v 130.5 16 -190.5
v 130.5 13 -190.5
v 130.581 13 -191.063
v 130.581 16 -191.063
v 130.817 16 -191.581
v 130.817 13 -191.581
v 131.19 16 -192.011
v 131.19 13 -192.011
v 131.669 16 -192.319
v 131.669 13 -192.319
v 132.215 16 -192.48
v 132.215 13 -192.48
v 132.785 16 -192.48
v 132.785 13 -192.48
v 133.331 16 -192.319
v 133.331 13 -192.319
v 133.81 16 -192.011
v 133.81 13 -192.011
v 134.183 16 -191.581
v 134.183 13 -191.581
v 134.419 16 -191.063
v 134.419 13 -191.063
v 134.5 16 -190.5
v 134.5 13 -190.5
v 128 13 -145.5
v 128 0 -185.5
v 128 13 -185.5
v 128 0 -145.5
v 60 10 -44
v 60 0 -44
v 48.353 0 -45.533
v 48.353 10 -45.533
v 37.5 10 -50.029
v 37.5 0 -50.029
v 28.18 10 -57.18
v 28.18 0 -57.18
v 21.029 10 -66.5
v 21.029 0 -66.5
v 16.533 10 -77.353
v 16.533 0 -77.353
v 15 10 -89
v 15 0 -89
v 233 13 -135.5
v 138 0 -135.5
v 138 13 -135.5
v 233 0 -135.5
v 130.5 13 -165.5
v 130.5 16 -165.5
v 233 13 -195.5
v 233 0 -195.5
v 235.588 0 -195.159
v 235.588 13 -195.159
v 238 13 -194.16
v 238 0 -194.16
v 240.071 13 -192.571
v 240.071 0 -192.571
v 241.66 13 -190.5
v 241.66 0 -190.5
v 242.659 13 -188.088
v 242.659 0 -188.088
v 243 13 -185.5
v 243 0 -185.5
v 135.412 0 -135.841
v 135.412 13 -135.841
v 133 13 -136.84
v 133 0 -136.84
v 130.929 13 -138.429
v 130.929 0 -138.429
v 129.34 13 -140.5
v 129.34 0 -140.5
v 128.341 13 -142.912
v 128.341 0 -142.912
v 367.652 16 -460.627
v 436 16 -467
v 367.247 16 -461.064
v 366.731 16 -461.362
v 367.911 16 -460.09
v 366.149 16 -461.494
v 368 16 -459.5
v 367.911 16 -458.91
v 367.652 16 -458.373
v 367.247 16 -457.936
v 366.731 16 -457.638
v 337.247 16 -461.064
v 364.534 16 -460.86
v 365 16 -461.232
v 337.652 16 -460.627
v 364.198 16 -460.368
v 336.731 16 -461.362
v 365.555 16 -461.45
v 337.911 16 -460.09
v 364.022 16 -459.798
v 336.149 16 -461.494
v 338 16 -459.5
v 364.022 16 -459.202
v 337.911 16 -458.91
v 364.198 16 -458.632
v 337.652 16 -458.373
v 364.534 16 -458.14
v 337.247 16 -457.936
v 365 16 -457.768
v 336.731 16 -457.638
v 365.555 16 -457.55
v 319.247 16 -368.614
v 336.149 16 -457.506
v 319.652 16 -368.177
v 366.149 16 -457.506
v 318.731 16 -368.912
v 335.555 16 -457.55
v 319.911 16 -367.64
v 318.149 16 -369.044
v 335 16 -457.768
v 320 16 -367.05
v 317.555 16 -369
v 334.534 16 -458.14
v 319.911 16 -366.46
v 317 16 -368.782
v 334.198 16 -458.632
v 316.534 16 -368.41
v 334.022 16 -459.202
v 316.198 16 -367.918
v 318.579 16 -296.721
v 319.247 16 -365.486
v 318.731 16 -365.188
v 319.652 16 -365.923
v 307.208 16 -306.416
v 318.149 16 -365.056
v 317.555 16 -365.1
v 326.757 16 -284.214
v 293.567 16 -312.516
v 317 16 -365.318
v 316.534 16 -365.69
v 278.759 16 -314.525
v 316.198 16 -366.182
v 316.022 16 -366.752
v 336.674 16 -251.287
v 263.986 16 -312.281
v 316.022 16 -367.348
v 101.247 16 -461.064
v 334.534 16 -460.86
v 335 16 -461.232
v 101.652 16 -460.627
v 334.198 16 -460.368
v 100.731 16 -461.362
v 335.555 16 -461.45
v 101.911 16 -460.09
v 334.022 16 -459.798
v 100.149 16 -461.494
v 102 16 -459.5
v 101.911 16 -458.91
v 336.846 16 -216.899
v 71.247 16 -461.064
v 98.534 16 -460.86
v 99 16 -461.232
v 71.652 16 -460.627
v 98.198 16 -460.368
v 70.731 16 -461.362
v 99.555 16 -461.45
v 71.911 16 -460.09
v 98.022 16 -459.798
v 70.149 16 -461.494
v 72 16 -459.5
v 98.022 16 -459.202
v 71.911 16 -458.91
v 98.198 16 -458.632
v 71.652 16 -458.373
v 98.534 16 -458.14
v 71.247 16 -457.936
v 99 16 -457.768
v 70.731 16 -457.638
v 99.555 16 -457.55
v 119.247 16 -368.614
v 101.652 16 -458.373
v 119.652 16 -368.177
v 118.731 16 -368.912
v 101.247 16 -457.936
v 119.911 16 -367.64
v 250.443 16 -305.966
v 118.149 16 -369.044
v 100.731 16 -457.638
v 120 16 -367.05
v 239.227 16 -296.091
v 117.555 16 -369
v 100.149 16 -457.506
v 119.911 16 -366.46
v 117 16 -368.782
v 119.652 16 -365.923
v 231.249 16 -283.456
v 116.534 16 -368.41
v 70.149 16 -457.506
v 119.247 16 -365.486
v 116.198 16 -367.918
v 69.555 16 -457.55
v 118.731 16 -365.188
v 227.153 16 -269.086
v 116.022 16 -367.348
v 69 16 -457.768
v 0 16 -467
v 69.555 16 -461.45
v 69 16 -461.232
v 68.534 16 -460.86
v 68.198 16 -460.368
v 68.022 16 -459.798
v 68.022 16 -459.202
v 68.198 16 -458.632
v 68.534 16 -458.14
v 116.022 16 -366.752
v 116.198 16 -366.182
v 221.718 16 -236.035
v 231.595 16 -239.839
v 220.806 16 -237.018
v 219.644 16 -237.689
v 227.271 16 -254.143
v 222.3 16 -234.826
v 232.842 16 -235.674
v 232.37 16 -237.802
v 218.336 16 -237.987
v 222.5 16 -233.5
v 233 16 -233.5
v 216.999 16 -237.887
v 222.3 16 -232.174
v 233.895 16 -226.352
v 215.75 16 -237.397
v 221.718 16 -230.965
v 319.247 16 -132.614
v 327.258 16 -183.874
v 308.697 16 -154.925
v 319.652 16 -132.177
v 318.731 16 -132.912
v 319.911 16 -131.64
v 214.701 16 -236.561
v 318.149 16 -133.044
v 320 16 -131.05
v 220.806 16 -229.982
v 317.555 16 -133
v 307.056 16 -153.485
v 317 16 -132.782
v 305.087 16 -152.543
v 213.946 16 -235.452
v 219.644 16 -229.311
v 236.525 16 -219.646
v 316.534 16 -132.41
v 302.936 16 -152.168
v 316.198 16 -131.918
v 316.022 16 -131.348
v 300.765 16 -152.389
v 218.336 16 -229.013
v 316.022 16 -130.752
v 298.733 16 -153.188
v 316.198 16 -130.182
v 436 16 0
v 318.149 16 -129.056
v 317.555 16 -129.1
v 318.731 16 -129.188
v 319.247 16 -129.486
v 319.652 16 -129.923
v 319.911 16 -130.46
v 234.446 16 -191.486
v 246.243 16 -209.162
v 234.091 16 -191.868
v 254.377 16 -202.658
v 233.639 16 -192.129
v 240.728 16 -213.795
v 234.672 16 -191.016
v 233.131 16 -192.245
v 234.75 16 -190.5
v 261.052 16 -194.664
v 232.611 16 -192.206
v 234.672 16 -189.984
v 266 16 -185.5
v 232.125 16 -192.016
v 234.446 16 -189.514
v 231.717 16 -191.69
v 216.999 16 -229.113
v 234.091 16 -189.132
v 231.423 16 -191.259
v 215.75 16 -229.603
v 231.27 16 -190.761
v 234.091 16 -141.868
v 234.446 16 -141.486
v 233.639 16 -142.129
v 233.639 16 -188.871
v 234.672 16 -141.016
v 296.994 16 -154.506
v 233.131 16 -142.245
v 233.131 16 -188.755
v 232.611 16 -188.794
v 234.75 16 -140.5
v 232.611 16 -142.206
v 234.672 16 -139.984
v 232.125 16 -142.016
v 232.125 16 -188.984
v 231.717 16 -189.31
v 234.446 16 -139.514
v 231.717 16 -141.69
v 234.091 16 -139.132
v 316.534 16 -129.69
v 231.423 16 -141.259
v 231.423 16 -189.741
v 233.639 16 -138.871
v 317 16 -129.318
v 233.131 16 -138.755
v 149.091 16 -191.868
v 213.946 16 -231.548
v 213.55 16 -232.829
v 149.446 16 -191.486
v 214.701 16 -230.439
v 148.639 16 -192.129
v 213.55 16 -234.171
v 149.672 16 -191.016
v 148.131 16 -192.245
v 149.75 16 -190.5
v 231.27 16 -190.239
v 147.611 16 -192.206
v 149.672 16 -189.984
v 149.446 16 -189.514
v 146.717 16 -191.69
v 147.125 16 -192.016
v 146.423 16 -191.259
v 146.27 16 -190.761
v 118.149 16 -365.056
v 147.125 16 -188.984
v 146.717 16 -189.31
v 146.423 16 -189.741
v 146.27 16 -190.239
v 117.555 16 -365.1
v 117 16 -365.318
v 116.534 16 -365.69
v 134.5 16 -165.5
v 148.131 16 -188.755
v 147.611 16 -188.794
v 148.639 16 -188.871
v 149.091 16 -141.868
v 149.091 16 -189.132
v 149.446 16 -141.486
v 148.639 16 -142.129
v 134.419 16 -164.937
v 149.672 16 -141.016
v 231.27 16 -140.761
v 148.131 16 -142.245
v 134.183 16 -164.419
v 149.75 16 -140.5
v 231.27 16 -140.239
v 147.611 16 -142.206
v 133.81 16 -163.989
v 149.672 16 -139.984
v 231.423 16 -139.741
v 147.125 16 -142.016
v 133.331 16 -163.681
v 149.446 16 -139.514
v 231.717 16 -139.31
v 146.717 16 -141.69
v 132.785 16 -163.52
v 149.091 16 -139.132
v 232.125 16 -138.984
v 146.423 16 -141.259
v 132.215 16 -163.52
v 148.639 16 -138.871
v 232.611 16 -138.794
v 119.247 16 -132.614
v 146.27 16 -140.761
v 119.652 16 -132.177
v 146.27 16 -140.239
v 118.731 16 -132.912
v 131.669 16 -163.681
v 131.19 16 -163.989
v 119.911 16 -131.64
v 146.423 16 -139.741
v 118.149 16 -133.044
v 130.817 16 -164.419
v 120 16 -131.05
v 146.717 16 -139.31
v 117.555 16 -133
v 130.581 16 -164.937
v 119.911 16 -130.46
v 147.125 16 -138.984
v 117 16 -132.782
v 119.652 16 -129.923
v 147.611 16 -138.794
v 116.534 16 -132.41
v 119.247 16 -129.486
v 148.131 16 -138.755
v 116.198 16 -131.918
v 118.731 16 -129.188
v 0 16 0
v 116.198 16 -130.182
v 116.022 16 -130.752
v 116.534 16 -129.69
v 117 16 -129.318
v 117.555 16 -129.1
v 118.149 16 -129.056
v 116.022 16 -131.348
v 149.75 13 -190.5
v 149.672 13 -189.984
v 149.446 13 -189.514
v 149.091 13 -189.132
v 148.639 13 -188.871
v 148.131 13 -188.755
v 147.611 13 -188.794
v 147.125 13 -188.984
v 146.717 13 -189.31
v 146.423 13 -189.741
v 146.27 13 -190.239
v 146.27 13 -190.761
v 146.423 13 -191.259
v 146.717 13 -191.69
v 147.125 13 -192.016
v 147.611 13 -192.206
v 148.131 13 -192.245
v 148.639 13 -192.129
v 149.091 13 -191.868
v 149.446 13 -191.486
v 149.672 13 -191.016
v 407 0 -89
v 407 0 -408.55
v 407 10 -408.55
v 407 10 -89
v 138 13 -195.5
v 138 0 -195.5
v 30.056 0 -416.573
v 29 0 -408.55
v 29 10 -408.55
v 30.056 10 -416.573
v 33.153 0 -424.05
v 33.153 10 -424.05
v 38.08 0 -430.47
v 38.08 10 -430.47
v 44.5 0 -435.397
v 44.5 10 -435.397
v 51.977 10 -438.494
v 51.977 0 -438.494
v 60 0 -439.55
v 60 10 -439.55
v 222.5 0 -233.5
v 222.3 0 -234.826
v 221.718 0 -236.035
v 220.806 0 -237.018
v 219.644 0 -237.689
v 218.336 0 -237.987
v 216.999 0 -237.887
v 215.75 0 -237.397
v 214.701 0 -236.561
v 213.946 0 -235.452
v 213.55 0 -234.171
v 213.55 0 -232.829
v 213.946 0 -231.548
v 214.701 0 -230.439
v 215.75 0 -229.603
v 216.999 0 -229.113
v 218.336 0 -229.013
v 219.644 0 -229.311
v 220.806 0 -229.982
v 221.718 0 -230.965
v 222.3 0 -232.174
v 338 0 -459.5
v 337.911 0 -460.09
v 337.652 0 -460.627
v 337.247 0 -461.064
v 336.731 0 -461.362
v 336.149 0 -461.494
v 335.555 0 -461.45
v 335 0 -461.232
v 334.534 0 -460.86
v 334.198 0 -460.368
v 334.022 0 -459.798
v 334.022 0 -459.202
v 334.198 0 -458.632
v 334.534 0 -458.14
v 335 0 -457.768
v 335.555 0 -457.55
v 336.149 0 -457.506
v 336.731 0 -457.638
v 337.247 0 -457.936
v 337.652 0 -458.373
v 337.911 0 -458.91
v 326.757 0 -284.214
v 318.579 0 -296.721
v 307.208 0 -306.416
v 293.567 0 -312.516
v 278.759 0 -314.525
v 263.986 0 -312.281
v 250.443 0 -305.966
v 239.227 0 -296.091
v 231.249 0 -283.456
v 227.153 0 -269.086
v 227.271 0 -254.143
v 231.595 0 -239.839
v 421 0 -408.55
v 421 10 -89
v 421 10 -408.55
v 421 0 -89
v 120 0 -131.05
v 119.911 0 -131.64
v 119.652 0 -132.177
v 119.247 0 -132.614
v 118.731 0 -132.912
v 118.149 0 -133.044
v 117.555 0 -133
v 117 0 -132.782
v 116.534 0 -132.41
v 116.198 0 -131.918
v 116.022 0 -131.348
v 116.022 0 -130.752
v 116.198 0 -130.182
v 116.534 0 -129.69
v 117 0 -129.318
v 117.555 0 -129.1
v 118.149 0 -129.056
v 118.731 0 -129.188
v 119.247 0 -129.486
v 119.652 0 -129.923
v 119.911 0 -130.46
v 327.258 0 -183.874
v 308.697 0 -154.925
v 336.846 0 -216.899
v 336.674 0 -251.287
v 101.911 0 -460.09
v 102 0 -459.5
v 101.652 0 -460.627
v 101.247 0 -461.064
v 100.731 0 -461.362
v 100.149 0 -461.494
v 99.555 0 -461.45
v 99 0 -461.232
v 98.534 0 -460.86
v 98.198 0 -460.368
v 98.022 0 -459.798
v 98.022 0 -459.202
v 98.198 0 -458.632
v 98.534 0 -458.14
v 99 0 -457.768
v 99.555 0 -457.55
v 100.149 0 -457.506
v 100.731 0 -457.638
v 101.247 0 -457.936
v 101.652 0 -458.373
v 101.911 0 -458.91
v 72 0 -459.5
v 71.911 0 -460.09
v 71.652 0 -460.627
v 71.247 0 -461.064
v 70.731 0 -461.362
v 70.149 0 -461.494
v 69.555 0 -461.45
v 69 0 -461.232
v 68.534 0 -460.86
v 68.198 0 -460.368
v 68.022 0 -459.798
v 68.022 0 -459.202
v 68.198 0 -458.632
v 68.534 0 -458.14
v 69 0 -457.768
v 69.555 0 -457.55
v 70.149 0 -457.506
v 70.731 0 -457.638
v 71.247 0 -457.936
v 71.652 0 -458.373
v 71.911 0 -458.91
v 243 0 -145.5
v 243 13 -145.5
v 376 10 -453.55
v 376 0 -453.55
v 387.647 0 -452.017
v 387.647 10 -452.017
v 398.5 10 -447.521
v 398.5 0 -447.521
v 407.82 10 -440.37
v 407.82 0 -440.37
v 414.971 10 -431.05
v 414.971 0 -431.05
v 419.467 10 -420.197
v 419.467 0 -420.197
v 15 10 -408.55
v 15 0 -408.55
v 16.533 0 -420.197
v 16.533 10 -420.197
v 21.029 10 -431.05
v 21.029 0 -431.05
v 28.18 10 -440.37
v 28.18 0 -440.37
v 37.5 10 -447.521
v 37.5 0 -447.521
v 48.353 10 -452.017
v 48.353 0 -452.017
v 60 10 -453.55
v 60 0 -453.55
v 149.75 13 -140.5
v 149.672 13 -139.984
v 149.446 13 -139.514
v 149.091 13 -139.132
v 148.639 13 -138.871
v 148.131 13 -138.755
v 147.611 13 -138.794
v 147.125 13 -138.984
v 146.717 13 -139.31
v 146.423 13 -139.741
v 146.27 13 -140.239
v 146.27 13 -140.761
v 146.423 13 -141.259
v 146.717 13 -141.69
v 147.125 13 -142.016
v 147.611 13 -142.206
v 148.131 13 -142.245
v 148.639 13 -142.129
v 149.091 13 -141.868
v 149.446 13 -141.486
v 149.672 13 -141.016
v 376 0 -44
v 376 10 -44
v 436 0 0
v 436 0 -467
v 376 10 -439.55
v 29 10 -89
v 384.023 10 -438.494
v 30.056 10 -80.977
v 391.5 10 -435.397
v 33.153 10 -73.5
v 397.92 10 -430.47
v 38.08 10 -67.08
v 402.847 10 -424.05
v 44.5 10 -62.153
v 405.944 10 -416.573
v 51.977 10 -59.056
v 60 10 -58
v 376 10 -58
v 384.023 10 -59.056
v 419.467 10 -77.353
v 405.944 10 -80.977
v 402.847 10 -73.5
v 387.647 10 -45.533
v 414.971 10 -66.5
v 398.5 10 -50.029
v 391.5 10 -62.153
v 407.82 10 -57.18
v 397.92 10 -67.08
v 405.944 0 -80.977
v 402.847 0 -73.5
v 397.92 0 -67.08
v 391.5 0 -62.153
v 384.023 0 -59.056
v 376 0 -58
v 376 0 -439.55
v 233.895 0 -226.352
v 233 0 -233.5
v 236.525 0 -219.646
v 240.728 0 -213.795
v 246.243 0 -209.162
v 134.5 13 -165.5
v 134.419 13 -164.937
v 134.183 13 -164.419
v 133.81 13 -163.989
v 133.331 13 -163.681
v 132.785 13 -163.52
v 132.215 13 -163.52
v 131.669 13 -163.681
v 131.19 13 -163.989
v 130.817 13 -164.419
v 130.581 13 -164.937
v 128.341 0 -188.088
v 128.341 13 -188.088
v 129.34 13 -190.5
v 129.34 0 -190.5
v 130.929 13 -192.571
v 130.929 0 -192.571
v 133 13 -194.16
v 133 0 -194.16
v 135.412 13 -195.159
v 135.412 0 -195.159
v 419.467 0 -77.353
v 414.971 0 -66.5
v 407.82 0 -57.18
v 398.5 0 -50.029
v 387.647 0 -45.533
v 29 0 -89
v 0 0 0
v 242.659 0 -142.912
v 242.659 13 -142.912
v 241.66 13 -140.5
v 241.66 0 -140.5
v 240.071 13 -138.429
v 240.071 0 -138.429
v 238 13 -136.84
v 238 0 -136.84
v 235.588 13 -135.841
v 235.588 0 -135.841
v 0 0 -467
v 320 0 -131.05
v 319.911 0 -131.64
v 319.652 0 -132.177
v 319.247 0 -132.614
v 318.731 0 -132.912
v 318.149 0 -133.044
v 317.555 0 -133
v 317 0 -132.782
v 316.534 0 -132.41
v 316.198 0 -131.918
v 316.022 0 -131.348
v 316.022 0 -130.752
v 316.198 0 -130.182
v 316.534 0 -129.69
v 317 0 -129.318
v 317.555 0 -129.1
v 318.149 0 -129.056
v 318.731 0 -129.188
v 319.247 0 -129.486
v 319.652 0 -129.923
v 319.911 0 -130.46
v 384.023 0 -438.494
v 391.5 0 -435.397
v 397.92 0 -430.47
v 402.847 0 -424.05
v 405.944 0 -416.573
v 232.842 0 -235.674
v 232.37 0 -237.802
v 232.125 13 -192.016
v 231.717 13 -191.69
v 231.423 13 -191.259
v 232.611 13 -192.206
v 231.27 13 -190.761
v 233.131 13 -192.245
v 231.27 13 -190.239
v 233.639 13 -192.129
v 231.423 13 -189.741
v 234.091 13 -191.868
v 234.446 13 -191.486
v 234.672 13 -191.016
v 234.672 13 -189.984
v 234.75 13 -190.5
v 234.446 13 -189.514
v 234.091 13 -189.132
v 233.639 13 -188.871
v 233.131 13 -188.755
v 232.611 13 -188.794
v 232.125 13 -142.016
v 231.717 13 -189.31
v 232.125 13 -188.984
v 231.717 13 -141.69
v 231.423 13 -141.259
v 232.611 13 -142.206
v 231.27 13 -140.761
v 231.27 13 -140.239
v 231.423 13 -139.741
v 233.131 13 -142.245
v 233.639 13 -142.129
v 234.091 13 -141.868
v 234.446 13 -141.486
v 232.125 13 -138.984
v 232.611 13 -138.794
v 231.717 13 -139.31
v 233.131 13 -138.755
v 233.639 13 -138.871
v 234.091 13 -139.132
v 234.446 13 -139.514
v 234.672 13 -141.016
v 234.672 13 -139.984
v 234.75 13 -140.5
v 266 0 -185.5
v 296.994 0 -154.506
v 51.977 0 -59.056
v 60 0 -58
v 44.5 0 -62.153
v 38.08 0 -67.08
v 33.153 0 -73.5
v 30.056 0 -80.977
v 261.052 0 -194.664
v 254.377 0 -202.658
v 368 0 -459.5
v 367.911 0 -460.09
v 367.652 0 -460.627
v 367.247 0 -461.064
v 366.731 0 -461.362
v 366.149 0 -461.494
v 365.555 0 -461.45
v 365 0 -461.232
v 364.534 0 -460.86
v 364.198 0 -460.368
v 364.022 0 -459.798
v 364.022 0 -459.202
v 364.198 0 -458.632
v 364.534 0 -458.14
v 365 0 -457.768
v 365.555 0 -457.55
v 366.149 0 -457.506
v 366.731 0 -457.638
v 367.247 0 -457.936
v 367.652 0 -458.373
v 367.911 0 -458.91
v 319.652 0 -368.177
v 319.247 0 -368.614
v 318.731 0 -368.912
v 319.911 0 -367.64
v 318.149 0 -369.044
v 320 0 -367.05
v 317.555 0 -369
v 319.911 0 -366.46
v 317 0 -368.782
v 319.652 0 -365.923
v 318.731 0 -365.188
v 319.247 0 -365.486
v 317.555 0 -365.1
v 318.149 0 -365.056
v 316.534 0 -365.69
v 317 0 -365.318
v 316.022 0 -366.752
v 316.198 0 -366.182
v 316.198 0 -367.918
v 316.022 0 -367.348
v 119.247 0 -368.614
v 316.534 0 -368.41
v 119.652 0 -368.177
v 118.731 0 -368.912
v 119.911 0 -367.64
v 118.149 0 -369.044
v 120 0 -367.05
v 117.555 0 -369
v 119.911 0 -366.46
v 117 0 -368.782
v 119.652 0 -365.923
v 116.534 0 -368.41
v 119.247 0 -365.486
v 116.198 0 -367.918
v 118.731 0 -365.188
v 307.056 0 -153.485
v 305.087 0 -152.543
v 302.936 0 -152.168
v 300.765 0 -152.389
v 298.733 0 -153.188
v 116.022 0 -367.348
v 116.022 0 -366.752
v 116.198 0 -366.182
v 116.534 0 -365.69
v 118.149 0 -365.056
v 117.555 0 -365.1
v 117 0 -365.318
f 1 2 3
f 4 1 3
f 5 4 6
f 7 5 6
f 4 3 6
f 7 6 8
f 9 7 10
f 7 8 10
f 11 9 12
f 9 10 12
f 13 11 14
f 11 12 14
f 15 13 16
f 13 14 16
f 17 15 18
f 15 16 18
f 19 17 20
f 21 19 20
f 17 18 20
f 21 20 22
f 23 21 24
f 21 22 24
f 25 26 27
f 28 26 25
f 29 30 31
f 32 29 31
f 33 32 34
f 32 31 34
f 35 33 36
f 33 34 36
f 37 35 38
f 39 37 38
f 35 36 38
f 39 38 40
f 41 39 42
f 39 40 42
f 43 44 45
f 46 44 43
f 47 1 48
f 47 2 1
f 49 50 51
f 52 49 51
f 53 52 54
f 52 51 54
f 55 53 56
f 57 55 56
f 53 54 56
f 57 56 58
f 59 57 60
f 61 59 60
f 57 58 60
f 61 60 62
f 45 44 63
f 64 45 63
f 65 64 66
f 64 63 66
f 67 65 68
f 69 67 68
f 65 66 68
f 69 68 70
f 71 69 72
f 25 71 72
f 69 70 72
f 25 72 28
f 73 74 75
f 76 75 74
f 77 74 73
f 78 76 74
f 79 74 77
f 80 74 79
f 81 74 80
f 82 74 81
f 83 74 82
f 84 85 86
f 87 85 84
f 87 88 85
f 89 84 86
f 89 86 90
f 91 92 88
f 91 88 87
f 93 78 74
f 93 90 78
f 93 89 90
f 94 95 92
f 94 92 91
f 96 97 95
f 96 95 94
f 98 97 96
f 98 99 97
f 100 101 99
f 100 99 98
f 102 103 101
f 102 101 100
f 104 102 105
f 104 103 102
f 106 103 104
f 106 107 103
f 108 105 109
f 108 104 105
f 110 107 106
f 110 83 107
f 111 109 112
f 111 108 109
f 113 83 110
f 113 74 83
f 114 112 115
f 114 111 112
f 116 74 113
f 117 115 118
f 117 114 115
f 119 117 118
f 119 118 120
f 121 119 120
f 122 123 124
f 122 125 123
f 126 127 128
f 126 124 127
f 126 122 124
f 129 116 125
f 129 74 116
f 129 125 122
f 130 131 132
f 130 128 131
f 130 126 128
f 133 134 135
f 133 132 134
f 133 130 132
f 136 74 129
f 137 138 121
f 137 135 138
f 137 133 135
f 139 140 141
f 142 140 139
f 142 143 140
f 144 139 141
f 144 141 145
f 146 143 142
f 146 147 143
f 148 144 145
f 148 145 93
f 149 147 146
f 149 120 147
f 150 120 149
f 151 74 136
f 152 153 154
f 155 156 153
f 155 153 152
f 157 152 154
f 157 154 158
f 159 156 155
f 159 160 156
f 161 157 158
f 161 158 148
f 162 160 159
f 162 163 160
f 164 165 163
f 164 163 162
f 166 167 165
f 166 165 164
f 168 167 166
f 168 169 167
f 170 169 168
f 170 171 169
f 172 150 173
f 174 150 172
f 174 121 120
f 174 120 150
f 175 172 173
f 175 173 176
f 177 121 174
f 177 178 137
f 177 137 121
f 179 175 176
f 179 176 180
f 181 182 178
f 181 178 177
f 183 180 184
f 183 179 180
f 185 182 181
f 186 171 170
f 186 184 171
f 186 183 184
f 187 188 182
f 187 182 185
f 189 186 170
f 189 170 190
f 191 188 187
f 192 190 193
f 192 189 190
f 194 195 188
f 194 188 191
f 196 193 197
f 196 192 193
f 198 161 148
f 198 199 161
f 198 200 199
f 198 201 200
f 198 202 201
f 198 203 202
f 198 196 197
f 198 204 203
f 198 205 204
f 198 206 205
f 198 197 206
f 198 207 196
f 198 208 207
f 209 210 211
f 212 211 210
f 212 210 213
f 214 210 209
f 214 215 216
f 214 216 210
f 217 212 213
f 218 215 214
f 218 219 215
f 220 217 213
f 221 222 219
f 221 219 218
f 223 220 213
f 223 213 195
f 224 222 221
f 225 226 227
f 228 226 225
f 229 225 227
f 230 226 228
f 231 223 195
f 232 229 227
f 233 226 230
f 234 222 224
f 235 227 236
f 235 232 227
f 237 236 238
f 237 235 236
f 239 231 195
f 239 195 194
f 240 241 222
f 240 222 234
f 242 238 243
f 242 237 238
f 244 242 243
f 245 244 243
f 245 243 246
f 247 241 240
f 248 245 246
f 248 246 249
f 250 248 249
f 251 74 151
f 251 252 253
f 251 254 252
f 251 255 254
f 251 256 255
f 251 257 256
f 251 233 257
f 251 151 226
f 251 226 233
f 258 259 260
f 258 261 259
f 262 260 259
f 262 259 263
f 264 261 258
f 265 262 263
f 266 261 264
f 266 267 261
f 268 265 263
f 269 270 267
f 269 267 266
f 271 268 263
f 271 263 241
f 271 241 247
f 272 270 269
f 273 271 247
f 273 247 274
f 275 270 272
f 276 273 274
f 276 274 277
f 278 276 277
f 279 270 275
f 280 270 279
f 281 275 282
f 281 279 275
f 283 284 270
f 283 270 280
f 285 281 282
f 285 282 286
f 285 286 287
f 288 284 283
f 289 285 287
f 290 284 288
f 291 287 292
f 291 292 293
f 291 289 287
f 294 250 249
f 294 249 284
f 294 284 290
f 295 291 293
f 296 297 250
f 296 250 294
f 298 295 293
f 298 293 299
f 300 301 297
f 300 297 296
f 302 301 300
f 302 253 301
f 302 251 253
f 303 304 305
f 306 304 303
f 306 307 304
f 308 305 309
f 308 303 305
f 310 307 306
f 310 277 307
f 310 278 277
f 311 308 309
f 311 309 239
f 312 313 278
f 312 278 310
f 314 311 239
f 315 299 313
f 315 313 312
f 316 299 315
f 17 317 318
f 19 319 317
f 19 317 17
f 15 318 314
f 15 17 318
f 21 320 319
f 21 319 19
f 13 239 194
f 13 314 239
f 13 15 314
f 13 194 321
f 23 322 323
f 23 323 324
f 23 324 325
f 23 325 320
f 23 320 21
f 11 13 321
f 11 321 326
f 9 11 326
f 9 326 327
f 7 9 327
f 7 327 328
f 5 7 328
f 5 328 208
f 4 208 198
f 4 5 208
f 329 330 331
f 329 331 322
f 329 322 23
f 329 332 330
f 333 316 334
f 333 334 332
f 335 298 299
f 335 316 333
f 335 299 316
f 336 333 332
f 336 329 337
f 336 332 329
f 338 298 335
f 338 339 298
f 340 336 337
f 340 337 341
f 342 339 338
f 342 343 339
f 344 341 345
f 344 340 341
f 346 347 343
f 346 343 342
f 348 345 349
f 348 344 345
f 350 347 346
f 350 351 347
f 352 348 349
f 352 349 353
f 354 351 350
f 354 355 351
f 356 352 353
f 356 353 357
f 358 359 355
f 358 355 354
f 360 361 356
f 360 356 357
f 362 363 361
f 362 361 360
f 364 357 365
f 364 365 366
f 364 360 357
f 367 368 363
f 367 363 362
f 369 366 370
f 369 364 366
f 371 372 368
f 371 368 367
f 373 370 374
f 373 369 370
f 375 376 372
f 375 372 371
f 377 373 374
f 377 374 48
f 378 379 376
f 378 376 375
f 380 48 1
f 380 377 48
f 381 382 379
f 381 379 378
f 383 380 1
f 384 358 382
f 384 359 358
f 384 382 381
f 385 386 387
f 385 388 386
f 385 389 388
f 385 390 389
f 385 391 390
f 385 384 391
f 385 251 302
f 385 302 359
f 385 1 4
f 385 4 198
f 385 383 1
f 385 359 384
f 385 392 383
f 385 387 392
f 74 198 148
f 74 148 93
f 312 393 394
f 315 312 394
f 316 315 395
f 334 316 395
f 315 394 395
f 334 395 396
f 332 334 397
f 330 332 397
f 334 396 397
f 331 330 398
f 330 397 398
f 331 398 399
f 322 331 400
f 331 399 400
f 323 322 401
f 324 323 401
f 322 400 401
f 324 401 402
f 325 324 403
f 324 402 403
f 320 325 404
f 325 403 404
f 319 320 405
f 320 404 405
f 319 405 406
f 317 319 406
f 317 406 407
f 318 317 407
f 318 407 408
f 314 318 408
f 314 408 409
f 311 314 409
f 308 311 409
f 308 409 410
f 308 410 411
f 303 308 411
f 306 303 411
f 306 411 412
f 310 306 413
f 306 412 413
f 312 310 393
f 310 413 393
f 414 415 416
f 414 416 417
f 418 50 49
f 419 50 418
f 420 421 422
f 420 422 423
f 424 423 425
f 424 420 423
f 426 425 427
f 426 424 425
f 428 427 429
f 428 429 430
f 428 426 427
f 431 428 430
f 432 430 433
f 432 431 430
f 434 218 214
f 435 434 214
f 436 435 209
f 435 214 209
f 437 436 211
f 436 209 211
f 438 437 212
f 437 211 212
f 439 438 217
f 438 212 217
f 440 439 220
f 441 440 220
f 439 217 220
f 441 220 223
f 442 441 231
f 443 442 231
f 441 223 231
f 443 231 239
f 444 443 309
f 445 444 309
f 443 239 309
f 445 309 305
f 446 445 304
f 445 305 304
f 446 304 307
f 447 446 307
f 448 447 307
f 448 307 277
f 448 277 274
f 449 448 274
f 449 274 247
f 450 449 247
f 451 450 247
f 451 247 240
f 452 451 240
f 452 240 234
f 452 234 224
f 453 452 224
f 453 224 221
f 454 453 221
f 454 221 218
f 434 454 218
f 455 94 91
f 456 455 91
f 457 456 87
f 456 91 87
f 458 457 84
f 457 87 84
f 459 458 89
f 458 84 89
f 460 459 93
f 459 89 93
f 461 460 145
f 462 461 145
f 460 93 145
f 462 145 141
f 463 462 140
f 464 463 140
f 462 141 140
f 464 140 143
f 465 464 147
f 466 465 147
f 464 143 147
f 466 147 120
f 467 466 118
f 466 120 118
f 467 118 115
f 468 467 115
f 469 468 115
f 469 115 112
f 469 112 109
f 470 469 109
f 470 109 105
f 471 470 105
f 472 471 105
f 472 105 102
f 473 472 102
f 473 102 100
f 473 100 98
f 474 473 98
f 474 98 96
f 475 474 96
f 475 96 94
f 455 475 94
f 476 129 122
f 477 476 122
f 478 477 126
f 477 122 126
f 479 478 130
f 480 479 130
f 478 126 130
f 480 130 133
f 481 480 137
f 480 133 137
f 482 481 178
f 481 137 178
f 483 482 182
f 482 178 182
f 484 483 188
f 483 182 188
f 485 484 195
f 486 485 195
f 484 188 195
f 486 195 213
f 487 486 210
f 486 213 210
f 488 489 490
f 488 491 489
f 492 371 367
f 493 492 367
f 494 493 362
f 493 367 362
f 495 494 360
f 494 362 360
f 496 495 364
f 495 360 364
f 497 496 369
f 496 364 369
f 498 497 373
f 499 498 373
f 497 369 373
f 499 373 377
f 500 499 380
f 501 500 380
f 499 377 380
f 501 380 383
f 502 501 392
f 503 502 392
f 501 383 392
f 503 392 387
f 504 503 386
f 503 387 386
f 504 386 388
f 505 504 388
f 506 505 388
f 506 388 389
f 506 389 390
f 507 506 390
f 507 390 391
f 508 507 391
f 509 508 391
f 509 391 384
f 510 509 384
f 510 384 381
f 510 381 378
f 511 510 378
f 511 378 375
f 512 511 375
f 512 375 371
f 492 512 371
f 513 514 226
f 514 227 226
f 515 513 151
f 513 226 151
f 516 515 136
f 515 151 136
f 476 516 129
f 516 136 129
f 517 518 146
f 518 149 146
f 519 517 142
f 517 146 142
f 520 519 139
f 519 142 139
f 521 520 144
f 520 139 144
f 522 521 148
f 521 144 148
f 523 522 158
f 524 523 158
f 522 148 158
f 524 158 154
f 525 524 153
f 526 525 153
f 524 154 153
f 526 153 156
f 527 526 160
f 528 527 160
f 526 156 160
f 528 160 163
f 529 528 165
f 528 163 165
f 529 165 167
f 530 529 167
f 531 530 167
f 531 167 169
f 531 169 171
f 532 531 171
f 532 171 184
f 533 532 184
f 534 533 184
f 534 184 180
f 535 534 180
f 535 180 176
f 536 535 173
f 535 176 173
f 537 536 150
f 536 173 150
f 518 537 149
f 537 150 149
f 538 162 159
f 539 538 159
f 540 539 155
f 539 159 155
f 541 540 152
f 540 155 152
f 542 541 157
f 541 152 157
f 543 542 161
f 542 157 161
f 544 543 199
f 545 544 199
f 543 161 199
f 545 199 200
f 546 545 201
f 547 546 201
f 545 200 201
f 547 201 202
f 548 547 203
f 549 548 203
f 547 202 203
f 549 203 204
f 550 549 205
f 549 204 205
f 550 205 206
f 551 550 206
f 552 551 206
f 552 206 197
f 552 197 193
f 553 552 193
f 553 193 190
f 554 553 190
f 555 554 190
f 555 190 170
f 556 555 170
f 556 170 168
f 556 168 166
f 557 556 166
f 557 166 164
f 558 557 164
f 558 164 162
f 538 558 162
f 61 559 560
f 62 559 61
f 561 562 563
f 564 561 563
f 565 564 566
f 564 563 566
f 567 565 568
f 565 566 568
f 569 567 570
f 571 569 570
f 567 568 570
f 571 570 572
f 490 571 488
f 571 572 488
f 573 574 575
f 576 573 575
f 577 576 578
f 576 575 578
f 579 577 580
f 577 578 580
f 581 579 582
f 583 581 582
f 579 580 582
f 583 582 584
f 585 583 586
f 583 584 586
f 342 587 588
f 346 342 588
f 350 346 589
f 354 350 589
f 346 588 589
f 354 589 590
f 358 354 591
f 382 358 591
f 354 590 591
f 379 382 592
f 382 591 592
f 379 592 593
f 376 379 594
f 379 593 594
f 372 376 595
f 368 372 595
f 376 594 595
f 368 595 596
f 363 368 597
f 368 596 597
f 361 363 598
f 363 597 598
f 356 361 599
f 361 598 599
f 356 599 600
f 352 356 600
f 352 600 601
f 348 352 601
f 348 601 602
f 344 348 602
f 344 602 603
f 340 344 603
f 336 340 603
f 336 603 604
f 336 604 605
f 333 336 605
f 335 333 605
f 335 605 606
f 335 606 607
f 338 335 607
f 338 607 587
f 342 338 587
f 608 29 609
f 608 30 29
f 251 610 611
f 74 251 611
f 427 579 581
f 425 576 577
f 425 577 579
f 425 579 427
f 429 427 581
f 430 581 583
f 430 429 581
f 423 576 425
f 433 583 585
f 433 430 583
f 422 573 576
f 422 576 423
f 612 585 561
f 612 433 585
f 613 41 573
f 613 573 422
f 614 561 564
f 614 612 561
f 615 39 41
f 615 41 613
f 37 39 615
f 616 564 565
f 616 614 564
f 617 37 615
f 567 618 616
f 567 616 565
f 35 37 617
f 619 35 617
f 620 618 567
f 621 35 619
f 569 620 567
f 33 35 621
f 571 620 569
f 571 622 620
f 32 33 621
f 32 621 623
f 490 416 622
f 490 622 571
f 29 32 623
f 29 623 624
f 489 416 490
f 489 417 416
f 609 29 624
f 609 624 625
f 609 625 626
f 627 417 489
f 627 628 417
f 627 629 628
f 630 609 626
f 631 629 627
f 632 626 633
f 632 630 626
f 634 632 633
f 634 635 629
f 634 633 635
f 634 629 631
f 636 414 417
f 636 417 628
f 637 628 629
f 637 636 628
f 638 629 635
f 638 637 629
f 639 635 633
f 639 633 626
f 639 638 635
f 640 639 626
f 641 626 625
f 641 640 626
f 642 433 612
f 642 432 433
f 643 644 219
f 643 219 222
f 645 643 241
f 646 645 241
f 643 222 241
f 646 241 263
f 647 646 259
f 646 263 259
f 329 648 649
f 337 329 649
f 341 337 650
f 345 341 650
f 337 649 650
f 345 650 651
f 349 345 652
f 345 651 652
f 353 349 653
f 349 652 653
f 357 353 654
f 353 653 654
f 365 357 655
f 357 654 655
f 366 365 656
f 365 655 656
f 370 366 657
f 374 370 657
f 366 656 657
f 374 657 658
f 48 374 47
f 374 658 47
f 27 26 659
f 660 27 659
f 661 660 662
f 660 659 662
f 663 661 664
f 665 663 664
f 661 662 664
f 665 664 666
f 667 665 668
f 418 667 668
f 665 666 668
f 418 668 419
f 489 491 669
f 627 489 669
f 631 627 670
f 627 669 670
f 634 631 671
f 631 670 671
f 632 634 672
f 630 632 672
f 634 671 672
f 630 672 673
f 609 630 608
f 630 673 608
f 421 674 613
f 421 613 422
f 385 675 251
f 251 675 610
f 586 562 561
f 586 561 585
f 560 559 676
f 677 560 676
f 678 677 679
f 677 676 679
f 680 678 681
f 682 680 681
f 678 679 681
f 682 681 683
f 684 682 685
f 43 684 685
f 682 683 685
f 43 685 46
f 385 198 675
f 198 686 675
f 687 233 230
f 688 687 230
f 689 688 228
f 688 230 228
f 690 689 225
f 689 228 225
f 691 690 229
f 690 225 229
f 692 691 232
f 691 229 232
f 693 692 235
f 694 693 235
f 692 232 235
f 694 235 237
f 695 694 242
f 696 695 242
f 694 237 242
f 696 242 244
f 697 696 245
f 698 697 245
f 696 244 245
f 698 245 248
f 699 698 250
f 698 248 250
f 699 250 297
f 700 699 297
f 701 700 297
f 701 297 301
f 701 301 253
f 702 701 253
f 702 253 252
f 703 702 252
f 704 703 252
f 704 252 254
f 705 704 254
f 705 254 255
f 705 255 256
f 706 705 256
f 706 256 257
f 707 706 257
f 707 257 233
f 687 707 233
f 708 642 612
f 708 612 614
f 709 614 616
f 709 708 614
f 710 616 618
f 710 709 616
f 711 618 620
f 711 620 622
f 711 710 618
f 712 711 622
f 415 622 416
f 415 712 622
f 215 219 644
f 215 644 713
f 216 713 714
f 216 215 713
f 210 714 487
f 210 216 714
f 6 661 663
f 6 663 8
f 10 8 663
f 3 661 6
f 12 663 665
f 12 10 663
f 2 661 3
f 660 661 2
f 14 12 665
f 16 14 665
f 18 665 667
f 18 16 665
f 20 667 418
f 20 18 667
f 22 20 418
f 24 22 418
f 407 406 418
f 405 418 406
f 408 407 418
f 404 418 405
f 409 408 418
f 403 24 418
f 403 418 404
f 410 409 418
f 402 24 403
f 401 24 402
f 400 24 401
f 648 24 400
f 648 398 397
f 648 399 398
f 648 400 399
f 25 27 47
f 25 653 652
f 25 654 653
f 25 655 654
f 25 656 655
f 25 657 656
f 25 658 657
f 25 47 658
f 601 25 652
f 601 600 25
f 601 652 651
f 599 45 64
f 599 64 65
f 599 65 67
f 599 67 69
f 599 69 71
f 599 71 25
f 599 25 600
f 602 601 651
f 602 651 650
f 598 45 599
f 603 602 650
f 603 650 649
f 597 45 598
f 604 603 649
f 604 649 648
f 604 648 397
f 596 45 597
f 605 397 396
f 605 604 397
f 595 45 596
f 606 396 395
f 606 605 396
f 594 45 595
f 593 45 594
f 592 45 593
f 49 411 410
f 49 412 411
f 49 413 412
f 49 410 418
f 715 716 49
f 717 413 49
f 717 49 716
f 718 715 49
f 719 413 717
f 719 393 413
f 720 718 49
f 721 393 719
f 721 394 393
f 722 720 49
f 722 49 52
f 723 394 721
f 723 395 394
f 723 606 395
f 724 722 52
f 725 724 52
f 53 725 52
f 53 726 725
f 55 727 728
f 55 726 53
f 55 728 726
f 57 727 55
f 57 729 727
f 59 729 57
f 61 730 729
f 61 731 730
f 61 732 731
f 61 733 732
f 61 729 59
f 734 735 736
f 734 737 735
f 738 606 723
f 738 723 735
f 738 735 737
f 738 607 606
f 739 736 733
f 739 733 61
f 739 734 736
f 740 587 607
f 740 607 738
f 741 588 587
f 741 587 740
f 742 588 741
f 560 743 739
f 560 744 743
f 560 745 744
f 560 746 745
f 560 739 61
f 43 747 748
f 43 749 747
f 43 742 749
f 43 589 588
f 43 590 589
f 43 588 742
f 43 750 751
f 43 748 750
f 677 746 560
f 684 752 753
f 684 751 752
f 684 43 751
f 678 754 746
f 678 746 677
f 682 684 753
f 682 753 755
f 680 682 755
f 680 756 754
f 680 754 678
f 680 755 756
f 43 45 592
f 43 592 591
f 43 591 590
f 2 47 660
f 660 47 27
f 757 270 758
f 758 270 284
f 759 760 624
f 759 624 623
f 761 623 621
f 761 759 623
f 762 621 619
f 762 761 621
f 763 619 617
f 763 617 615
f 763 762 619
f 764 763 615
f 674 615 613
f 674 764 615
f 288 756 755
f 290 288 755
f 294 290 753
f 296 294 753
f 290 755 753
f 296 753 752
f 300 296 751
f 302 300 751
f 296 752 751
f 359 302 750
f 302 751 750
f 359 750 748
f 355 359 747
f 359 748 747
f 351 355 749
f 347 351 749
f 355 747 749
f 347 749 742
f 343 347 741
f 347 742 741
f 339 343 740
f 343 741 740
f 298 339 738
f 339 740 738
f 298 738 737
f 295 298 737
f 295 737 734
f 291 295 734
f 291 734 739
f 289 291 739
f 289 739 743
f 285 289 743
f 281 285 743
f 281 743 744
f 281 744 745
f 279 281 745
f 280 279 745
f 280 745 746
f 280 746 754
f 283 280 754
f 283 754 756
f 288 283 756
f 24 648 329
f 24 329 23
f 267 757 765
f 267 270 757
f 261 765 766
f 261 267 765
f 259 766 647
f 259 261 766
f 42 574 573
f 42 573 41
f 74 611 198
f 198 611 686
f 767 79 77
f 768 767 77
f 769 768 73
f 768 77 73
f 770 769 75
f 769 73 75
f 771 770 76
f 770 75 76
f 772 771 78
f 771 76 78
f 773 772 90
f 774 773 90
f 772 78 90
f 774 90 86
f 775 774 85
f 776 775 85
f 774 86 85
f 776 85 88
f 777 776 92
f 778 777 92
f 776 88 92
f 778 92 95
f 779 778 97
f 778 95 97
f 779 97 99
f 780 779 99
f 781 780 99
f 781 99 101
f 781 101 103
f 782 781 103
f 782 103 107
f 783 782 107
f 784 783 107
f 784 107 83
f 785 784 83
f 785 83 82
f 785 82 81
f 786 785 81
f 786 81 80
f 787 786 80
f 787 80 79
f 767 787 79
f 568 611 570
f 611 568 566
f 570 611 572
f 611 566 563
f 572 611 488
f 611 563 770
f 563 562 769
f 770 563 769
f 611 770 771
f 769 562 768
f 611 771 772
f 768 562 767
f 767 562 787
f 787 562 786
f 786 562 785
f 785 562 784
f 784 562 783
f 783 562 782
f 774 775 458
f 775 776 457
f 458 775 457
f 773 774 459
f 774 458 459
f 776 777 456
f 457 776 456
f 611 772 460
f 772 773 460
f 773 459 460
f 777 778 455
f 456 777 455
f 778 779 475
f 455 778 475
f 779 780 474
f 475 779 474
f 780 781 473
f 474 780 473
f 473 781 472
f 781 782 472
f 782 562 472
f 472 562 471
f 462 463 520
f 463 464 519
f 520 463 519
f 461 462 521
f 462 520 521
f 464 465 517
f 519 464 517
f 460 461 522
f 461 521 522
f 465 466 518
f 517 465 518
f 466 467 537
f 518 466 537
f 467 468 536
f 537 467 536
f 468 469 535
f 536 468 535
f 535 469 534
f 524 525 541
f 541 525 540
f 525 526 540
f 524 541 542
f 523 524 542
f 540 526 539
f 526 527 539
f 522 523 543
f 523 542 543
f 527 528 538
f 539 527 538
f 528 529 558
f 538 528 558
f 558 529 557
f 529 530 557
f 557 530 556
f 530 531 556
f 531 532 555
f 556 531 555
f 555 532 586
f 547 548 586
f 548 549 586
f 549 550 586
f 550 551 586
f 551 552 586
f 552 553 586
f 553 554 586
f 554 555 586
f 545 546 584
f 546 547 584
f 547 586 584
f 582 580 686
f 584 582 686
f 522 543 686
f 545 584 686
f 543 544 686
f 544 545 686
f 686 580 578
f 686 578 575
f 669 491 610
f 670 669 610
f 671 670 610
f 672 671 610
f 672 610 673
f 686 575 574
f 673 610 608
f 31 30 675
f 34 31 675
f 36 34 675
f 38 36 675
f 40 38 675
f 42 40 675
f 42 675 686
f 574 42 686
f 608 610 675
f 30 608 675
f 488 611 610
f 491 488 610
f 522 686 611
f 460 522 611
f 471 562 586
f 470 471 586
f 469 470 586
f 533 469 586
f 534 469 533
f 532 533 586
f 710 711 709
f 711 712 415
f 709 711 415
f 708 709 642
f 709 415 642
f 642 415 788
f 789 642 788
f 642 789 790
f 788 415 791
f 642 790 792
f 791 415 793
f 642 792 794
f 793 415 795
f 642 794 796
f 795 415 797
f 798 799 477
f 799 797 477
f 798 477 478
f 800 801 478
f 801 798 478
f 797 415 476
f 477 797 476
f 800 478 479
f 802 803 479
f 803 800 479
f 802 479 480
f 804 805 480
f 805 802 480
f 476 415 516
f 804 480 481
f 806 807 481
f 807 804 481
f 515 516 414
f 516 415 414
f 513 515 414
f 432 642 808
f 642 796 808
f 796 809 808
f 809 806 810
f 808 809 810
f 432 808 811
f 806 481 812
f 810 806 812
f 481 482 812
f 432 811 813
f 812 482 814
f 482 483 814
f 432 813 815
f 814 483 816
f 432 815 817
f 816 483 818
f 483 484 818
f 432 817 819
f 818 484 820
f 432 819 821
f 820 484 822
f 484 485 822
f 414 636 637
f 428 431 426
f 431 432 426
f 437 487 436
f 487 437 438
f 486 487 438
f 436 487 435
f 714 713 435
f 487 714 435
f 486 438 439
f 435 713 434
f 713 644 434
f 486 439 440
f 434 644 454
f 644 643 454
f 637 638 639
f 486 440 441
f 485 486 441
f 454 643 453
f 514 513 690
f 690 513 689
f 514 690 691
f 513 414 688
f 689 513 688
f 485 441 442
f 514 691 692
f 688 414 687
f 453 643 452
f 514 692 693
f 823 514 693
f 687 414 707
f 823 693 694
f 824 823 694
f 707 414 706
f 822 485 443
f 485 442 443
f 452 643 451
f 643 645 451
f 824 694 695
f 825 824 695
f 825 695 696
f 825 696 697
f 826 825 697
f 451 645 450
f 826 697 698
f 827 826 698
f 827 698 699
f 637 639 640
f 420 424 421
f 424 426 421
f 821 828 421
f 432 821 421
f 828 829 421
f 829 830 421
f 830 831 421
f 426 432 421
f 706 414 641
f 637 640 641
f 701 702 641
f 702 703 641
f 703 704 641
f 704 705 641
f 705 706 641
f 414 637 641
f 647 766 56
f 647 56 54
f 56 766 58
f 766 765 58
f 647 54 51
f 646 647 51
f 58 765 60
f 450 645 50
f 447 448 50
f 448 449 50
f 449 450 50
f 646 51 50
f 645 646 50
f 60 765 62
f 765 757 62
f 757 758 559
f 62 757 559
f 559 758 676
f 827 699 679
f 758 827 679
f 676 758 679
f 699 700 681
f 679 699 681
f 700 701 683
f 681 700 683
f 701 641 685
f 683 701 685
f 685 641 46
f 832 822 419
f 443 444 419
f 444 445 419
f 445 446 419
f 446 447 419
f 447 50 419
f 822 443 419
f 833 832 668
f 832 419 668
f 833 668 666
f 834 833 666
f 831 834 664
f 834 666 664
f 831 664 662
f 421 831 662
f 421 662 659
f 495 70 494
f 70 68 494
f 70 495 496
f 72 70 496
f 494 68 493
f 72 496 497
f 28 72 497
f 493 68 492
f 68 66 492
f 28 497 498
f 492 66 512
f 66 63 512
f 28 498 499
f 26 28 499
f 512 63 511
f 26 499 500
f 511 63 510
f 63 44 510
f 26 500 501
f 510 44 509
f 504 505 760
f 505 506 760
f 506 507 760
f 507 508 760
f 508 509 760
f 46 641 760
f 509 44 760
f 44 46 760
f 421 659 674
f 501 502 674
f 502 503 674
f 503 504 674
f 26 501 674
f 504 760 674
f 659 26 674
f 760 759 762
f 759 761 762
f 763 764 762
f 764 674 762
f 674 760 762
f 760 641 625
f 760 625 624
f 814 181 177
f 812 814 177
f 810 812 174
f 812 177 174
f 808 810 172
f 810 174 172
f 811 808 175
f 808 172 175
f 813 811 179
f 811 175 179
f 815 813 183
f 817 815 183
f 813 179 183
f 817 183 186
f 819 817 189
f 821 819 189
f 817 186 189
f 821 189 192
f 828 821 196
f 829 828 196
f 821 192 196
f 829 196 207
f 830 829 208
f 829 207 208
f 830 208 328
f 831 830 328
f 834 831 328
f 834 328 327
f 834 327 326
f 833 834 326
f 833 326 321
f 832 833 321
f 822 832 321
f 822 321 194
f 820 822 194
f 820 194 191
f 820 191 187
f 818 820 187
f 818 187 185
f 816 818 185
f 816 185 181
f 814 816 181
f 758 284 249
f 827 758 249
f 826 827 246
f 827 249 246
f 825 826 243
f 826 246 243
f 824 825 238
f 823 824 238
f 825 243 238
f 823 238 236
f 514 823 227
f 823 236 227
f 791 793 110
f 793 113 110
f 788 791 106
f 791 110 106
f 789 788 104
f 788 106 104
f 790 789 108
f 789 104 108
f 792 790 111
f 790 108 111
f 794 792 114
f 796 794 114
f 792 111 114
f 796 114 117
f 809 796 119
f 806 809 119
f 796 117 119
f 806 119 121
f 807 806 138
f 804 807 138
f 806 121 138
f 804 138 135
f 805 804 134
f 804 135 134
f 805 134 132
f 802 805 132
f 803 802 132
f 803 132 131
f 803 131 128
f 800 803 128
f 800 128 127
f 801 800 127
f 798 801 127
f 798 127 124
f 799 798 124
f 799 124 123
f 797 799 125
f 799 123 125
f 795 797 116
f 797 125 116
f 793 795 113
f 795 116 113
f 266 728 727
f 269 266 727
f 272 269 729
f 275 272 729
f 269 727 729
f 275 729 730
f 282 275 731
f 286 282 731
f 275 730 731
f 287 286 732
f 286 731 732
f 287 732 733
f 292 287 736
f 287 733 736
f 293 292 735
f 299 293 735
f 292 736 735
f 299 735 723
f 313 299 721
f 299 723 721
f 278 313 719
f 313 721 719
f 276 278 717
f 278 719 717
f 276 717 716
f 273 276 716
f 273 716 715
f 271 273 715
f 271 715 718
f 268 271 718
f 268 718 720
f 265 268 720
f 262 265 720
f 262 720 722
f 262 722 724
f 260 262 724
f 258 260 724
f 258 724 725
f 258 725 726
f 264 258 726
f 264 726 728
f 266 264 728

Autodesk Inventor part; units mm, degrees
ref_plane "YZ Plane" through (0, 0, 0) normal (1, 0, 0) x (0, 1, 0)
ref_plane "XZ Plane" through (0, 0, 0) normal (0, 1, 0) x (-1, 0, 0)
ref_plane "XY Plane" through (0, 0, 0) normal (0, 0, 1) x (1, 0, 0)
sketch "Sketch1" plane through (0, 0, 0) normal (0, 1, 0) x (-1, 0, 0)
  line L0 (0, 0) -> (-436, 0)
  line L1 (-436, 0) -> (-436, -467)
  line L2 (-436, -467) -> (0, -467)
  line L3 (0, -467) -> (0, 0)
  dimension "d0" = 436
  dimension "d1" = 467
extrude "Extrusion1" add sketch "Sketch1" along normal blind 16
sketch "Sketch2" plane through (0, 16, 0) normal (0, 1, 0) x (1, 0, 0)
  circle A0 centre (366, 459.5) radius 2
  line L0 (436, 467) -> (0, 467)
  circle A1 centre (336, 459.5) radius 2
  circle A2 centre (100, 459.5) radius 2
  circle A3 centre (70, 459.5) radius 2
  line L1 (436, 0) -> (436, 467) projected
  line L2 (0, 467) -> (0, 0) projected
  circle A4 centre (218, 233.5) radius 4.5
  circle A5 centre (118, 131.05) radius 2
  circle A6 centre (318, 131.05) radius 2
  circle A7 centre (118, 367.05) radius 2
  circle A8 centre (318, 367.05) radius 2
  line L3 (0, 0) -> (436, 0) projected
  line L4 (218, 218.5) -> (218, 165.5)
  line L5 (218, 233.5) -> (338, 233.5) construction
  arc A9 (266, 185.5) -> (246.243, 209.1616) centre (218, 165.5) ccw
  line L6 (266, 185.5) -> (302.8528, 148.6472)
  circle A10 centre (218, 233.5) radius 120
  line L7 (231.5946, 239.8393) -> (326.7569, 284.2142)
  circle A11 centre (218, 233.5) radius 15
  arc A12 (326.7569, 284.2142) -> (231.5946, 239.8393) centre (279.1758, 262.0267) ccw
  arc A13 (233, 233.5) -> (246.243, 209.1616) centre (261.9865, 233.5) ccw
  arc A14 (296.9937, 154.5063) -> (308.697, 154.9248) centre (302.6505, 160.1632) ccw
  point P0 (228.6066, 222.8934)
  dimension "d4" = 4
  dimension "d9" = 30
  dimension "d18" = 7.5
  dimension "d24" = 30
  dimension "d31" = 70
  dimension "d32" = 70
  dimension "d33" = 9
  dimension "d34" = 218
  dimension "d35" = 233.5
  dimension "d36" = 4
  dimension "d37" = 102.45
  dimension "d40" = 200
  dimension "d43" = 236
  dimension "d47" = 100
  dimension "d58" = 68
  dimension "d59" = 90
  dimension "d63" = 52
  dimension "d64" = 240
  dimension "d66" = 115
  dimension "d67" = 30
  dimension "d68" = 105
  dimension "d69" = 45
  dimension "d70" = 8
  dimension "d98" = 7.5
extrude "Extrusion2" cut sketch "Sketch2" against normal through all contours A0 | A1 | A3 | A4 | A5 | A6 | A7 | A8 | A9 A13 A11 L7 A10 A14 L6 | A12 L7
sketch "Sketch3" plane through (0, 0, 0) normal (0, -1, 0) x (1, 0, 0)
  circle A0 centre (218, -165.5) radius 52
  circle A1 centre (218, -233.5) radius 4.5 projected
  arc A2 (246.243, -209.1616) -> (266, -185.5) centre (218, -165.5) ccw projected
  line L0 (233, -195.5) -> (138, -195.5)
  line L1 (128, -185.5) -> (128, -145.5)
  line L2 (138, -135.5) -> (233, -135.5)
  line L3 (243, -145.5) -> (243, -185.5)
  arc A3 (138, -135.5) -> (128, -145.5) centre (138, -145.5) ccw
  arc A4 (128, -185.5) -> (138, -195.5) centre (138, -185.5) ccw
  arc A5 (233, -195.5) -> (243, -185.5) centre (233, -185.5) ccw
  arc A6 (243, -145.5) -> (233, -135.5) centre (233, -145.5) ccw
  point P0 (0, 0)
  point P1 (243, -195.5)
  point P2 (128, -135.5)
  point P3 (128, -195.5)
  point P4 (243, -135.5)
  dimension "d71" = 104
  dimension "d73" = 115
  dimension "d74" = 60
  dimension "d75" = 30
  dimension "d76" = 25
  dimension "d97" = 10
extrude "Extrusion3" cut sketch "Sketch3" against normal blind 13 contours L0 A4 L1 A3 L2 A0 | A0 L2 A6 L3 A5 L0 picked at (210.7335, -163.9792)
sketch "Sketch4" plane through (0, 13, 0) normal (0, -1, 0) x (1, 0, 0)
  line L0 (134.5, -165.5) -> (134.5, -190.5)
  line L1 (130.5, -190.5) -> (130.5, -165.5)
  arc A0 (130.5, -190.5) -> (134.5, -190.5) centre (132.5, -190.5) ccw
  arc A1 (134.5, -165.5) -> (130.5, -165.5) centre (132.5, -165.5) ccw
  line L2 (233, -195.5) -> (138, -195.5) projected
  line L3 (128, -185.5) -> (128, -145.5) projected
  circle A2 centre (148, -140.5) radius 1.75
  line L4 (138, -135.5) -> (233, -135.5) projected
  circle A3 centre (233, -140.5) radius 1.75
  circle A4 centre (148, -190.5) radius 1.75
  circle A5 centre (233, -190.5) radius 1.75
  point P0 (0, 0)
  point P1 (243, -195.5)
  point P2 (128, -195.5)
  point P3 (128, -135.5)
  point P4 (243, -135.5)
  dimension "d79" = 4
  dimension "d81" = 25
  dimension "d82" = 5
  dimension "d83" = 2.5
  dimension "d84" = 3.5
  dimension "d85" = 5
  dimension "d86" = 20
  dimension "d89" = 85
  dimension "d92" = 50
extrude "Extrusion4" cut sketch "Sketch4" against normal through all
sketch "Sketch5" plane through (0, 16, 0) normal (0, 1, 0) x (1, 0, 0)
  circle A0 centre (100, 459.5) radius 2
  circle A1 centre (70, 459.5) radius 2 projected
  point P0 (0, 0)
  dimension "d99" = 0
  dimension "d100" = 30
extrude "Extrusion5" cut sketch "Sketch5" against normal through all contours A0
sketch "Sketch6" plane through (0, 0, 0) normal (0, -1, 0) x (1, 0, 0)
  line L0 (376, -453.55) -> (60, -453.55)
  line L1 (15, -408.55) -> (15, -89)
  line L2 (60, -44) -> (376, -44)
  line L3 (421, -89) -> (421, -408.55)
  line L4 (0, -467) -> (0, 0) projected
  line L5 (436, 0) -> (436, -467) projected
  line L6 (0, 0) -> (436, 0) projected
  line L7 (436, -467) -> (0, -467) projected
  arc A0 (15, -408.55) -> (60, -453.55) centre (60, -408.55) ccw
  arc A1 (376, -453.55) -> (421, -408.55) centre (376, -408.55) ccw
  arc A2 (421, -89) -> (376, -44) centre (376, -89) ccw
  arc A3 (60, -44) -> (15, -89) centre (60, -89) ccw
  line L8 (60, -439.55) -> (376, -439.55)
  arc A4 (376, -439.55) -> (407, -408.55) centre (376, -408.55) ccw
  line L9 (407, -408.55) -> (407, -89)
  arc A5 (407, -89) -> (376, -58) centre (376, -89) ccw
  line L10 (376, -58) -> (60, -58)
  arc A6 (60, -58) -> (29, -89) centre (60, -89) ccw
  line L11 (29, -89) -> (29, -408.55)
  arc A7 (29, -408.55) -> (60, -439.55) centre (60, -408.55) ccw
  dimension "d104" = 15
  dimension "d105" = 15
  dimension "d106" = 44
  dimension "d107" = 13.45
  dimension "d108" = 45
  dimension "d109" = 14
extrude "Extrusion6" cut sketch "Sketch6" against normal blind 10 contours L0 A0 L1 A3 L2 A2 L3 A1
equation "\"d36\" = screws"
equation "\"screws\" = 4"
properties part number "bin_lid"
